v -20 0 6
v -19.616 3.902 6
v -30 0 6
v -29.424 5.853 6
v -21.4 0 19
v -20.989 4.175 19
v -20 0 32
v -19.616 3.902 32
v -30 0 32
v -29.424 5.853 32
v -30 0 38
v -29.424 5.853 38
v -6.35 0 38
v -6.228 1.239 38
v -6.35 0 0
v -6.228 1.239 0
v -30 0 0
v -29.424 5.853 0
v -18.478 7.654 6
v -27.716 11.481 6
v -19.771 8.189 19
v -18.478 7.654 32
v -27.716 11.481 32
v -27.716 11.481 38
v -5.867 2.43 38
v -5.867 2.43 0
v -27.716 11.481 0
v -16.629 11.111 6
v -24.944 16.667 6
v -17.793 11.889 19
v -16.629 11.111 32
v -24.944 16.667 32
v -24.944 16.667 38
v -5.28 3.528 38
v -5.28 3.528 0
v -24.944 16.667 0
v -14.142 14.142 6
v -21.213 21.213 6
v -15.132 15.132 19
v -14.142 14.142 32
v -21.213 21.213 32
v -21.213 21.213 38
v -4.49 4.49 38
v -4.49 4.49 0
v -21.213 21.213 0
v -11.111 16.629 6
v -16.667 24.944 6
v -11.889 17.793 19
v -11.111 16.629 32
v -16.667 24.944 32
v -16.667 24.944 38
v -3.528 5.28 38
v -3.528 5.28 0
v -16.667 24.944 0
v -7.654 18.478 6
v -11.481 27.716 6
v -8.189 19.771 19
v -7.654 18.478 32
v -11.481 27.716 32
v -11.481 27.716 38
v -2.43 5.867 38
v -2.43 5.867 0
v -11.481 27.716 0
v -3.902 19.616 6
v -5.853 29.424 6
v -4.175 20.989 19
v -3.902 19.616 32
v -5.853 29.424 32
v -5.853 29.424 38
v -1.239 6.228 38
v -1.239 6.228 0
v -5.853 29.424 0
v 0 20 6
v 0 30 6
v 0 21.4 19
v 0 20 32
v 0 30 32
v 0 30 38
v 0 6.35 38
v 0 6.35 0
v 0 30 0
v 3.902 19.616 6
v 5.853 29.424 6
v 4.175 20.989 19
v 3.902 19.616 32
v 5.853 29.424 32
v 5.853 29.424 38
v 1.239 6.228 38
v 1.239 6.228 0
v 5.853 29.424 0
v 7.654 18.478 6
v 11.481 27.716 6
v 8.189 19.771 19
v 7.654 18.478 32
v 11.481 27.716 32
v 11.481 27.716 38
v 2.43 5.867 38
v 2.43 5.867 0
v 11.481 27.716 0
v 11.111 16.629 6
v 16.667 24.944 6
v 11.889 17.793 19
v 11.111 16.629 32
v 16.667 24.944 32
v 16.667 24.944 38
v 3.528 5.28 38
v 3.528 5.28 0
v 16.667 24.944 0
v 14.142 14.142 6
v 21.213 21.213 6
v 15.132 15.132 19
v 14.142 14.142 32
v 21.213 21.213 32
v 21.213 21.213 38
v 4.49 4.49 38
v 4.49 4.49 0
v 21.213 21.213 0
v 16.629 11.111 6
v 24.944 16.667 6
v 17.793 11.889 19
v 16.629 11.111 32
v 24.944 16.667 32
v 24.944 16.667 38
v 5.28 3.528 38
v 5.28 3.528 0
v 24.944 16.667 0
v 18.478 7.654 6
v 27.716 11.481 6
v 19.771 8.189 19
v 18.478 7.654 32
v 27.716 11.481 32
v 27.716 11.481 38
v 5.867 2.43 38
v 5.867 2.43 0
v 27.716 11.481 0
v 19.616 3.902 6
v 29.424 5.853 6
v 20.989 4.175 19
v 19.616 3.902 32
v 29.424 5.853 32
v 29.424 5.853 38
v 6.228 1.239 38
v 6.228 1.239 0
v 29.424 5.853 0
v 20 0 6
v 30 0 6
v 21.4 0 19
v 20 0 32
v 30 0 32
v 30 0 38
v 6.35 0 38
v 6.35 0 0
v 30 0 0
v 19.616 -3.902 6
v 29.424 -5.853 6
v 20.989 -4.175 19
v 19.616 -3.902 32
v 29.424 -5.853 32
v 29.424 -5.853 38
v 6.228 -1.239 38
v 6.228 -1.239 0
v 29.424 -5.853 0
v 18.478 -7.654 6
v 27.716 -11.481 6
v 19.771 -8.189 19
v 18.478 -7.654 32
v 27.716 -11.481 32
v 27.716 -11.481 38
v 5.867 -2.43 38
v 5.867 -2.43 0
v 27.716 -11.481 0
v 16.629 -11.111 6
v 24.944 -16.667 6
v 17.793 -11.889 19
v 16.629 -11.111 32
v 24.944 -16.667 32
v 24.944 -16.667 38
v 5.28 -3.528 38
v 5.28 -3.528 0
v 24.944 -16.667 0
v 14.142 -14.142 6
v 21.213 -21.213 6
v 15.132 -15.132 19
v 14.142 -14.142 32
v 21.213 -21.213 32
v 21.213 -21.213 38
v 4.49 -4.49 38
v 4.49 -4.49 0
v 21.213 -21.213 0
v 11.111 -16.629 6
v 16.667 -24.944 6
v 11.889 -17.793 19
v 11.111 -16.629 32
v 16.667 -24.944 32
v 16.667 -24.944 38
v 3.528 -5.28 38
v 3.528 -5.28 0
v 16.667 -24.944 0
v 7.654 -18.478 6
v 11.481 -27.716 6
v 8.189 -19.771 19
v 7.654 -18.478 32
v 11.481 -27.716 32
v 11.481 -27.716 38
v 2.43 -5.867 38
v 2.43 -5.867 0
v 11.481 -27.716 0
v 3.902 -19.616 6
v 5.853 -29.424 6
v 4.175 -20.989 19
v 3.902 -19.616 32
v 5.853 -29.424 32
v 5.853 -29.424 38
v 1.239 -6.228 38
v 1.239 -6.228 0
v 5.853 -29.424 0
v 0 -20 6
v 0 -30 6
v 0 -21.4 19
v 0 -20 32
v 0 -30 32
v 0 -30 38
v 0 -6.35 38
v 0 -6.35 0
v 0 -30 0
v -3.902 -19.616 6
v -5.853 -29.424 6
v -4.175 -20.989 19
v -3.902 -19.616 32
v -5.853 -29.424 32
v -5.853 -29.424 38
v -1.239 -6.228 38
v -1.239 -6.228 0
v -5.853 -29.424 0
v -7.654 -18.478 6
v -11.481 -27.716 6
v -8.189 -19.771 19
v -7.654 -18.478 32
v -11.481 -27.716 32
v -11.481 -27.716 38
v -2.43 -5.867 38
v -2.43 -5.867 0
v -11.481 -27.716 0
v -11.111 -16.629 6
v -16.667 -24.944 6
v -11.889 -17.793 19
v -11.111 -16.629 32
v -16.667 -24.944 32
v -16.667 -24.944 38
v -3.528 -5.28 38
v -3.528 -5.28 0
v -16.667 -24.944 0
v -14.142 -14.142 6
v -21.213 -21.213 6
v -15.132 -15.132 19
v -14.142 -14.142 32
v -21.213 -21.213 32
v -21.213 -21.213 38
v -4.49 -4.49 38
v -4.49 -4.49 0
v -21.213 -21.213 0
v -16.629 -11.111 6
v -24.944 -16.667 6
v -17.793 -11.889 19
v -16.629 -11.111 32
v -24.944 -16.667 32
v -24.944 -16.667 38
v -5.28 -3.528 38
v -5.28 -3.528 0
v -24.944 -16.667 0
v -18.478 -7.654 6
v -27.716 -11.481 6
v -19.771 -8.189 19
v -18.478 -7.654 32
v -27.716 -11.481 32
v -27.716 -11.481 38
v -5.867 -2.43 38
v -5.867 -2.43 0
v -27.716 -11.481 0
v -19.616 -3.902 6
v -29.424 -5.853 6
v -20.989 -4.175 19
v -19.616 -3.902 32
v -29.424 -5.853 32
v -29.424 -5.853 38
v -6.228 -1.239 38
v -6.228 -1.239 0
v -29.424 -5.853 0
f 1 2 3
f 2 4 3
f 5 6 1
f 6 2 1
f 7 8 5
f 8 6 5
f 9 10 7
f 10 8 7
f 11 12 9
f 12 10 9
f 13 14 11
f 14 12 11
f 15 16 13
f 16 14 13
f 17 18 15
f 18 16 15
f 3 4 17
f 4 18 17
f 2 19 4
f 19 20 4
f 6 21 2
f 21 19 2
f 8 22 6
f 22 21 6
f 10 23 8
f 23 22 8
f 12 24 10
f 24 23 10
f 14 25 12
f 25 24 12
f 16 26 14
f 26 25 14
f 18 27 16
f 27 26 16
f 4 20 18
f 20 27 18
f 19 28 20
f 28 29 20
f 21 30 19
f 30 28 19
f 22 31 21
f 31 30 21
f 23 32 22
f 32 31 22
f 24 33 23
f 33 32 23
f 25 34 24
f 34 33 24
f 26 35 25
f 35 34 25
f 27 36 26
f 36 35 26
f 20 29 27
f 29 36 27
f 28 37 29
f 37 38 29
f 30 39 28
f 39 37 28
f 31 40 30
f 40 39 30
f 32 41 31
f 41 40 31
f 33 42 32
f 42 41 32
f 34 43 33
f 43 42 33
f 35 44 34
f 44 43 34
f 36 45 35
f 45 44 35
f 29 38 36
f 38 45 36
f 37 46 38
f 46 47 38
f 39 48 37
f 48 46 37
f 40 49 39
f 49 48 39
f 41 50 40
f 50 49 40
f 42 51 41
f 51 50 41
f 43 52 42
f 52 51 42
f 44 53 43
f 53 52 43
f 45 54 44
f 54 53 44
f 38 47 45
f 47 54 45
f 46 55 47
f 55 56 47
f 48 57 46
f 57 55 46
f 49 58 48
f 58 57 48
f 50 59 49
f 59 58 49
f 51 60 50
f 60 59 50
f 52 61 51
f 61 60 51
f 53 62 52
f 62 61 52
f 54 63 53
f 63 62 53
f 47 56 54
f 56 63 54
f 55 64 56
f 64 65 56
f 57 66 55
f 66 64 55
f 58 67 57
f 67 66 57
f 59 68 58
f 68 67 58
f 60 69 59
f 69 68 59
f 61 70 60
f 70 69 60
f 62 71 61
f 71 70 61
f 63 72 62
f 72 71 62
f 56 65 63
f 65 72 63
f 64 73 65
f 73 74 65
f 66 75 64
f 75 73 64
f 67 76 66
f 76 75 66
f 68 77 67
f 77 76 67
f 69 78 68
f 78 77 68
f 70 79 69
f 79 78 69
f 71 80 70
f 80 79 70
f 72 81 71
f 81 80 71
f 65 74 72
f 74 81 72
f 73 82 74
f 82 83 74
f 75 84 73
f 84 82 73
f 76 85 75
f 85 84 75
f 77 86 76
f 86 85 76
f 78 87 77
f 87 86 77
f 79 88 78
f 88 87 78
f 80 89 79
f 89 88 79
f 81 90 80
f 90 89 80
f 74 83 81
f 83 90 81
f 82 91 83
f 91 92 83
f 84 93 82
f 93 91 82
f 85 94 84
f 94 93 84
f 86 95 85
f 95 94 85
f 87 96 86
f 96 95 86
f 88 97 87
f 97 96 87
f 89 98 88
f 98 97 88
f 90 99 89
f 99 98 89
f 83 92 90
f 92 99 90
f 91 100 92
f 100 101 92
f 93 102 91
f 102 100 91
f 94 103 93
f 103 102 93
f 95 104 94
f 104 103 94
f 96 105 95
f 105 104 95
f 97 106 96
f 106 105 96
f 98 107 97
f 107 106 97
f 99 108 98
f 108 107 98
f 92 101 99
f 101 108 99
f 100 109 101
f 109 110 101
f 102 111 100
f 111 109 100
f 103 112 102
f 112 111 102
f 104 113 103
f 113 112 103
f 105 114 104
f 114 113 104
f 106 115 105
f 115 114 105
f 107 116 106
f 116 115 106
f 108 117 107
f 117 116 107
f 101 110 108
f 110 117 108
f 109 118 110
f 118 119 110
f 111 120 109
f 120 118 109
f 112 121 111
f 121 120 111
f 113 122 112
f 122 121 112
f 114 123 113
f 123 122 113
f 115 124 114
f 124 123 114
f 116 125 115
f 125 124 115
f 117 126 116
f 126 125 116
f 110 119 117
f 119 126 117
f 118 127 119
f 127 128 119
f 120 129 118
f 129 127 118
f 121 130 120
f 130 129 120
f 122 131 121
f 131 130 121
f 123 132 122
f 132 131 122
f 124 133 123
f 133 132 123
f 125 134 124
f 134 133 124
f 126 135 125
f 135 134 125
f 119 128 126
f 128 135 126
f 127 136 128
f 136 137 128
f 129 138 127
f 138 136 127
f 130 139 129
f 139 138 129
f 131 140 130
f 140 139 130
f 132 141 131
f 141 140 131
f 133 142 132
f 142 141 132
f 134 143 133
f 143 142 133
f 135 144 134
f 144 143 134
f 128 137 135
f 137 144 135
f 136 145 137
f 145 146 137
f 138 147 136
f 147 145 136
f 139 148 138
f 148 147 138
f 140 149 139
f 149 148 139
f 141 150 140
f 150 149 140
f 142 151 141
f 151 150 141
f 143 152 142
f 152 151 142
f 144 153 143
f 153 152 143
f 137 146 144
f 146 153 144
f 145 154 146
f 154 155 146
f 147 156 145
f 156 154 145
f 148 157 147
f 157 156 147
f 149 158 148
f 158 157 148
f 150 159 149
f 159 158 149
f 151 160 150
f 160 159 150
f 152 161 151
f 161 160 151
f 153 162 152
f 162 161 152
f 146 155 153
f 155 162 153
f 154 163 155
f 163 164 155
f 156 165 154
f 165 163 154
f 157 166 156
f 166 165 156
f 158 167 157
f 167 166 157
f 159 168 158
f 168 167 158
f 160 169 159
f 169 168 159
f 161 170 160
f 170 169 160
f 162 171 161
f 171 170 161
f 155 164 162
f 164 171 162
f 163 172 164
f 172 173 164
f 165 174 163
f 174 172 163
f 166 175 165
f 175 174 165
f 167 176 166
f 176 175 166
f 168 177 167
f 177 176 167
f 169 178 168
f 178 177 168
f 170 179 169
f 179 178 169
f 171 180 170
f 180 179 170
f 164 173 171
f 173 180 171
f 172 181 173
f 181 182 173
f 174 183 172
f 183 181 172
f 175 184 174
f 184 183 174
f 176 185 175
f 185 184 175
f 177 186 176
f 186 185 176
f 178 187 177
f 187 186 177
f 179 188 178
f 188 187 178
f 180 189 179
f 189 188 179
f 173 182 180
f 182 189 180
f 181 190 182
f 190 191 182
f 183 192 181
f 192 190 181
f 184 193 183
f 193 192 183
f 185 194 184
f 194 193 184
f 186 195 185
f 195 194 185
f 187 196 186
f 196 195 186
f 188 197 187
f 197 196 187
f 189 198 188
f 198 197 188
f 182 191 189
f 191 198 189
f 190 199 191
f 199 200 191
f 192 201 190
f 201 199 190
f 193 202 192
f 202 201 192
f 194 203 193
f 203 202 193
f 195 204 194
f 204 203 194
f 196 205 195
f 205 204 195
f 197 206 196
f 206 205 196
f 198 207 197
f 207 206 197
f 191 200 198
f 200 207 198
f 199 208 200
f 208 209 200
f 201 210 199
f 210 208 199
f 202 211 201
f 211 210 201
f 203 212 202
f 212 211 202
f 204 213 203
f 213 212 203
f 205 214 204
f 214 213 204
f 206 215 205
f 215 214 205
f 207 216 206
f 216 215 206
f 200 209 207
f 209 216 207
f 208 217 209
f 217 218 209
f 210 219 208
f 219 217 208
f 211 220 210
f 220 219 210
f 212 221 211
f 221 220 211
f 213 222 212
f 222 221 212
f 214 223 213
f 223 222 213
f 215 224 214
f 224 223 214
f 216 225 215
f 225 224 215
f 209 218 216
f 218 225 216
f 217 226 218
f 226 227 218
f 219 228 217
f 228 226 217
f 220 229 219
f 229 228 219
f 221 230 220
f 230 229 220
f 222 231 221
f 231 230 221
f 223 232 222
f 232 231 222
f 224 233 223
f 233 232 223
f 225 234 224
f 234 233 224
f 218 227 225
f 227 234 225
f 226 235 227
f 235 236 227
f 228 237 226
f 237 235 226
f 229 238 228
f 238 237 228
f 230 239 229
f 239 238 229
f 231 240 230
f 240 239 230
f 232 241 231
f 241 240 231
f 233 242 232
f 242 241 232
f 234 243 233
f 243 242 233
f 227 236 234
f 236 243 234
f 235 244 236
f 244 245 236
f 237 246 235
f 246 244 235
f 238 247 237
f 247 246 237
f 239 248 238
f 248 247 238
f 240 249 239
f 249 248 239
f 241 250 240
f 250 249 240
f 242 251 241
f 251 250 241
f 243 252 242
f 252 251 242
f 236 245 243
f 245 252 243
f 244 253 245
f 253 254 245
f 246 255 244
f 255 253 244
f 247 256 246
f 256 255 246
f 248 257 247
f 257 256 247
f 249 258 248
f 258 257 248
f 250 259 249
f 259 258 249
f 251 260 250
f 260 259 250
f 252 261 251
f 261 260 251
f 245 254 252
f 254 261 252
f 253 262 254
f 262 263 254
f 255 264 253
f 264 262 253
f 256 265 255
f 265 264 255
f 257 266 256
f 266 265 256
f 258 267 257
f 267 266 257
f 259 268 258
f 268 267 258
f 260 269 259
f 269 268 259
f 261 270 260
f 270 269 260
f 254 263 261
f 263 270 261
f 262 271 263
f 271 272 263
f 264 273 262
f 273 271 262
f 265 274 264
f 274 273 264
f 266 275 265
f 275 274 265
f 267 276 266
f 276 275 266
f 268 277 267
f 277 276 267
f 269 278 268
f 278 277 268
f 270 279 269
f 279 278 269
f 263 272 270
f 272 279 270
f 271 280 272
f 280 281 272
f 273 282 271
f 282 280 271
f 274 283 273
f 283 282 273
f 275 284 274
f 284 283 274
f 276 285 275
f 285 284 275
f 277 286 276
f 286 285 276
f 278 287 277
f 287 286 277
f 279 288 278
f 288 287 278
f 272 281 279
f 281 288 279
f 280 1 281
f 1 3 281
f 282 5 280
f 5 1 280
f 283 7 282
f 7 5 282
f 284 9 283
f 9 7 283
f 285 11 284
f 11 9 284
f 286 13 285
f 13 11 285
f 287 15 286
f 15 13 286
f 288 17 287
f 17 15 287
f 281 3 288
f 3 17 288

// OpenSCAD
$fn = 32;

// ----------------------------------------------------------------------
// Belt roller: 40 mm barrel, 38 mm wide, bore 12.7 mm
// ----------------------------------------------------------------------

// --- parameters (mm) ---
bore_d = 12.7;            // bore
barrel_d = 40;            // barrel diameter
roller_w = 38;            // roller width
flange_d = 60;            // flange diameter
flange_t = 6;             // flange thickness
hub_d = 36.7;             // hub diameter

roller_profile = [[6.35, 0], [30, 0], [30, 6], [20, 6], [21.4, 19], [20, 32], [30, 32], [30, 38], [6.35, 38]];

/* the profile stays clear of the axis, so the bore comes out of the revolve */
rotate_extrude() polygon(roller_profile);
